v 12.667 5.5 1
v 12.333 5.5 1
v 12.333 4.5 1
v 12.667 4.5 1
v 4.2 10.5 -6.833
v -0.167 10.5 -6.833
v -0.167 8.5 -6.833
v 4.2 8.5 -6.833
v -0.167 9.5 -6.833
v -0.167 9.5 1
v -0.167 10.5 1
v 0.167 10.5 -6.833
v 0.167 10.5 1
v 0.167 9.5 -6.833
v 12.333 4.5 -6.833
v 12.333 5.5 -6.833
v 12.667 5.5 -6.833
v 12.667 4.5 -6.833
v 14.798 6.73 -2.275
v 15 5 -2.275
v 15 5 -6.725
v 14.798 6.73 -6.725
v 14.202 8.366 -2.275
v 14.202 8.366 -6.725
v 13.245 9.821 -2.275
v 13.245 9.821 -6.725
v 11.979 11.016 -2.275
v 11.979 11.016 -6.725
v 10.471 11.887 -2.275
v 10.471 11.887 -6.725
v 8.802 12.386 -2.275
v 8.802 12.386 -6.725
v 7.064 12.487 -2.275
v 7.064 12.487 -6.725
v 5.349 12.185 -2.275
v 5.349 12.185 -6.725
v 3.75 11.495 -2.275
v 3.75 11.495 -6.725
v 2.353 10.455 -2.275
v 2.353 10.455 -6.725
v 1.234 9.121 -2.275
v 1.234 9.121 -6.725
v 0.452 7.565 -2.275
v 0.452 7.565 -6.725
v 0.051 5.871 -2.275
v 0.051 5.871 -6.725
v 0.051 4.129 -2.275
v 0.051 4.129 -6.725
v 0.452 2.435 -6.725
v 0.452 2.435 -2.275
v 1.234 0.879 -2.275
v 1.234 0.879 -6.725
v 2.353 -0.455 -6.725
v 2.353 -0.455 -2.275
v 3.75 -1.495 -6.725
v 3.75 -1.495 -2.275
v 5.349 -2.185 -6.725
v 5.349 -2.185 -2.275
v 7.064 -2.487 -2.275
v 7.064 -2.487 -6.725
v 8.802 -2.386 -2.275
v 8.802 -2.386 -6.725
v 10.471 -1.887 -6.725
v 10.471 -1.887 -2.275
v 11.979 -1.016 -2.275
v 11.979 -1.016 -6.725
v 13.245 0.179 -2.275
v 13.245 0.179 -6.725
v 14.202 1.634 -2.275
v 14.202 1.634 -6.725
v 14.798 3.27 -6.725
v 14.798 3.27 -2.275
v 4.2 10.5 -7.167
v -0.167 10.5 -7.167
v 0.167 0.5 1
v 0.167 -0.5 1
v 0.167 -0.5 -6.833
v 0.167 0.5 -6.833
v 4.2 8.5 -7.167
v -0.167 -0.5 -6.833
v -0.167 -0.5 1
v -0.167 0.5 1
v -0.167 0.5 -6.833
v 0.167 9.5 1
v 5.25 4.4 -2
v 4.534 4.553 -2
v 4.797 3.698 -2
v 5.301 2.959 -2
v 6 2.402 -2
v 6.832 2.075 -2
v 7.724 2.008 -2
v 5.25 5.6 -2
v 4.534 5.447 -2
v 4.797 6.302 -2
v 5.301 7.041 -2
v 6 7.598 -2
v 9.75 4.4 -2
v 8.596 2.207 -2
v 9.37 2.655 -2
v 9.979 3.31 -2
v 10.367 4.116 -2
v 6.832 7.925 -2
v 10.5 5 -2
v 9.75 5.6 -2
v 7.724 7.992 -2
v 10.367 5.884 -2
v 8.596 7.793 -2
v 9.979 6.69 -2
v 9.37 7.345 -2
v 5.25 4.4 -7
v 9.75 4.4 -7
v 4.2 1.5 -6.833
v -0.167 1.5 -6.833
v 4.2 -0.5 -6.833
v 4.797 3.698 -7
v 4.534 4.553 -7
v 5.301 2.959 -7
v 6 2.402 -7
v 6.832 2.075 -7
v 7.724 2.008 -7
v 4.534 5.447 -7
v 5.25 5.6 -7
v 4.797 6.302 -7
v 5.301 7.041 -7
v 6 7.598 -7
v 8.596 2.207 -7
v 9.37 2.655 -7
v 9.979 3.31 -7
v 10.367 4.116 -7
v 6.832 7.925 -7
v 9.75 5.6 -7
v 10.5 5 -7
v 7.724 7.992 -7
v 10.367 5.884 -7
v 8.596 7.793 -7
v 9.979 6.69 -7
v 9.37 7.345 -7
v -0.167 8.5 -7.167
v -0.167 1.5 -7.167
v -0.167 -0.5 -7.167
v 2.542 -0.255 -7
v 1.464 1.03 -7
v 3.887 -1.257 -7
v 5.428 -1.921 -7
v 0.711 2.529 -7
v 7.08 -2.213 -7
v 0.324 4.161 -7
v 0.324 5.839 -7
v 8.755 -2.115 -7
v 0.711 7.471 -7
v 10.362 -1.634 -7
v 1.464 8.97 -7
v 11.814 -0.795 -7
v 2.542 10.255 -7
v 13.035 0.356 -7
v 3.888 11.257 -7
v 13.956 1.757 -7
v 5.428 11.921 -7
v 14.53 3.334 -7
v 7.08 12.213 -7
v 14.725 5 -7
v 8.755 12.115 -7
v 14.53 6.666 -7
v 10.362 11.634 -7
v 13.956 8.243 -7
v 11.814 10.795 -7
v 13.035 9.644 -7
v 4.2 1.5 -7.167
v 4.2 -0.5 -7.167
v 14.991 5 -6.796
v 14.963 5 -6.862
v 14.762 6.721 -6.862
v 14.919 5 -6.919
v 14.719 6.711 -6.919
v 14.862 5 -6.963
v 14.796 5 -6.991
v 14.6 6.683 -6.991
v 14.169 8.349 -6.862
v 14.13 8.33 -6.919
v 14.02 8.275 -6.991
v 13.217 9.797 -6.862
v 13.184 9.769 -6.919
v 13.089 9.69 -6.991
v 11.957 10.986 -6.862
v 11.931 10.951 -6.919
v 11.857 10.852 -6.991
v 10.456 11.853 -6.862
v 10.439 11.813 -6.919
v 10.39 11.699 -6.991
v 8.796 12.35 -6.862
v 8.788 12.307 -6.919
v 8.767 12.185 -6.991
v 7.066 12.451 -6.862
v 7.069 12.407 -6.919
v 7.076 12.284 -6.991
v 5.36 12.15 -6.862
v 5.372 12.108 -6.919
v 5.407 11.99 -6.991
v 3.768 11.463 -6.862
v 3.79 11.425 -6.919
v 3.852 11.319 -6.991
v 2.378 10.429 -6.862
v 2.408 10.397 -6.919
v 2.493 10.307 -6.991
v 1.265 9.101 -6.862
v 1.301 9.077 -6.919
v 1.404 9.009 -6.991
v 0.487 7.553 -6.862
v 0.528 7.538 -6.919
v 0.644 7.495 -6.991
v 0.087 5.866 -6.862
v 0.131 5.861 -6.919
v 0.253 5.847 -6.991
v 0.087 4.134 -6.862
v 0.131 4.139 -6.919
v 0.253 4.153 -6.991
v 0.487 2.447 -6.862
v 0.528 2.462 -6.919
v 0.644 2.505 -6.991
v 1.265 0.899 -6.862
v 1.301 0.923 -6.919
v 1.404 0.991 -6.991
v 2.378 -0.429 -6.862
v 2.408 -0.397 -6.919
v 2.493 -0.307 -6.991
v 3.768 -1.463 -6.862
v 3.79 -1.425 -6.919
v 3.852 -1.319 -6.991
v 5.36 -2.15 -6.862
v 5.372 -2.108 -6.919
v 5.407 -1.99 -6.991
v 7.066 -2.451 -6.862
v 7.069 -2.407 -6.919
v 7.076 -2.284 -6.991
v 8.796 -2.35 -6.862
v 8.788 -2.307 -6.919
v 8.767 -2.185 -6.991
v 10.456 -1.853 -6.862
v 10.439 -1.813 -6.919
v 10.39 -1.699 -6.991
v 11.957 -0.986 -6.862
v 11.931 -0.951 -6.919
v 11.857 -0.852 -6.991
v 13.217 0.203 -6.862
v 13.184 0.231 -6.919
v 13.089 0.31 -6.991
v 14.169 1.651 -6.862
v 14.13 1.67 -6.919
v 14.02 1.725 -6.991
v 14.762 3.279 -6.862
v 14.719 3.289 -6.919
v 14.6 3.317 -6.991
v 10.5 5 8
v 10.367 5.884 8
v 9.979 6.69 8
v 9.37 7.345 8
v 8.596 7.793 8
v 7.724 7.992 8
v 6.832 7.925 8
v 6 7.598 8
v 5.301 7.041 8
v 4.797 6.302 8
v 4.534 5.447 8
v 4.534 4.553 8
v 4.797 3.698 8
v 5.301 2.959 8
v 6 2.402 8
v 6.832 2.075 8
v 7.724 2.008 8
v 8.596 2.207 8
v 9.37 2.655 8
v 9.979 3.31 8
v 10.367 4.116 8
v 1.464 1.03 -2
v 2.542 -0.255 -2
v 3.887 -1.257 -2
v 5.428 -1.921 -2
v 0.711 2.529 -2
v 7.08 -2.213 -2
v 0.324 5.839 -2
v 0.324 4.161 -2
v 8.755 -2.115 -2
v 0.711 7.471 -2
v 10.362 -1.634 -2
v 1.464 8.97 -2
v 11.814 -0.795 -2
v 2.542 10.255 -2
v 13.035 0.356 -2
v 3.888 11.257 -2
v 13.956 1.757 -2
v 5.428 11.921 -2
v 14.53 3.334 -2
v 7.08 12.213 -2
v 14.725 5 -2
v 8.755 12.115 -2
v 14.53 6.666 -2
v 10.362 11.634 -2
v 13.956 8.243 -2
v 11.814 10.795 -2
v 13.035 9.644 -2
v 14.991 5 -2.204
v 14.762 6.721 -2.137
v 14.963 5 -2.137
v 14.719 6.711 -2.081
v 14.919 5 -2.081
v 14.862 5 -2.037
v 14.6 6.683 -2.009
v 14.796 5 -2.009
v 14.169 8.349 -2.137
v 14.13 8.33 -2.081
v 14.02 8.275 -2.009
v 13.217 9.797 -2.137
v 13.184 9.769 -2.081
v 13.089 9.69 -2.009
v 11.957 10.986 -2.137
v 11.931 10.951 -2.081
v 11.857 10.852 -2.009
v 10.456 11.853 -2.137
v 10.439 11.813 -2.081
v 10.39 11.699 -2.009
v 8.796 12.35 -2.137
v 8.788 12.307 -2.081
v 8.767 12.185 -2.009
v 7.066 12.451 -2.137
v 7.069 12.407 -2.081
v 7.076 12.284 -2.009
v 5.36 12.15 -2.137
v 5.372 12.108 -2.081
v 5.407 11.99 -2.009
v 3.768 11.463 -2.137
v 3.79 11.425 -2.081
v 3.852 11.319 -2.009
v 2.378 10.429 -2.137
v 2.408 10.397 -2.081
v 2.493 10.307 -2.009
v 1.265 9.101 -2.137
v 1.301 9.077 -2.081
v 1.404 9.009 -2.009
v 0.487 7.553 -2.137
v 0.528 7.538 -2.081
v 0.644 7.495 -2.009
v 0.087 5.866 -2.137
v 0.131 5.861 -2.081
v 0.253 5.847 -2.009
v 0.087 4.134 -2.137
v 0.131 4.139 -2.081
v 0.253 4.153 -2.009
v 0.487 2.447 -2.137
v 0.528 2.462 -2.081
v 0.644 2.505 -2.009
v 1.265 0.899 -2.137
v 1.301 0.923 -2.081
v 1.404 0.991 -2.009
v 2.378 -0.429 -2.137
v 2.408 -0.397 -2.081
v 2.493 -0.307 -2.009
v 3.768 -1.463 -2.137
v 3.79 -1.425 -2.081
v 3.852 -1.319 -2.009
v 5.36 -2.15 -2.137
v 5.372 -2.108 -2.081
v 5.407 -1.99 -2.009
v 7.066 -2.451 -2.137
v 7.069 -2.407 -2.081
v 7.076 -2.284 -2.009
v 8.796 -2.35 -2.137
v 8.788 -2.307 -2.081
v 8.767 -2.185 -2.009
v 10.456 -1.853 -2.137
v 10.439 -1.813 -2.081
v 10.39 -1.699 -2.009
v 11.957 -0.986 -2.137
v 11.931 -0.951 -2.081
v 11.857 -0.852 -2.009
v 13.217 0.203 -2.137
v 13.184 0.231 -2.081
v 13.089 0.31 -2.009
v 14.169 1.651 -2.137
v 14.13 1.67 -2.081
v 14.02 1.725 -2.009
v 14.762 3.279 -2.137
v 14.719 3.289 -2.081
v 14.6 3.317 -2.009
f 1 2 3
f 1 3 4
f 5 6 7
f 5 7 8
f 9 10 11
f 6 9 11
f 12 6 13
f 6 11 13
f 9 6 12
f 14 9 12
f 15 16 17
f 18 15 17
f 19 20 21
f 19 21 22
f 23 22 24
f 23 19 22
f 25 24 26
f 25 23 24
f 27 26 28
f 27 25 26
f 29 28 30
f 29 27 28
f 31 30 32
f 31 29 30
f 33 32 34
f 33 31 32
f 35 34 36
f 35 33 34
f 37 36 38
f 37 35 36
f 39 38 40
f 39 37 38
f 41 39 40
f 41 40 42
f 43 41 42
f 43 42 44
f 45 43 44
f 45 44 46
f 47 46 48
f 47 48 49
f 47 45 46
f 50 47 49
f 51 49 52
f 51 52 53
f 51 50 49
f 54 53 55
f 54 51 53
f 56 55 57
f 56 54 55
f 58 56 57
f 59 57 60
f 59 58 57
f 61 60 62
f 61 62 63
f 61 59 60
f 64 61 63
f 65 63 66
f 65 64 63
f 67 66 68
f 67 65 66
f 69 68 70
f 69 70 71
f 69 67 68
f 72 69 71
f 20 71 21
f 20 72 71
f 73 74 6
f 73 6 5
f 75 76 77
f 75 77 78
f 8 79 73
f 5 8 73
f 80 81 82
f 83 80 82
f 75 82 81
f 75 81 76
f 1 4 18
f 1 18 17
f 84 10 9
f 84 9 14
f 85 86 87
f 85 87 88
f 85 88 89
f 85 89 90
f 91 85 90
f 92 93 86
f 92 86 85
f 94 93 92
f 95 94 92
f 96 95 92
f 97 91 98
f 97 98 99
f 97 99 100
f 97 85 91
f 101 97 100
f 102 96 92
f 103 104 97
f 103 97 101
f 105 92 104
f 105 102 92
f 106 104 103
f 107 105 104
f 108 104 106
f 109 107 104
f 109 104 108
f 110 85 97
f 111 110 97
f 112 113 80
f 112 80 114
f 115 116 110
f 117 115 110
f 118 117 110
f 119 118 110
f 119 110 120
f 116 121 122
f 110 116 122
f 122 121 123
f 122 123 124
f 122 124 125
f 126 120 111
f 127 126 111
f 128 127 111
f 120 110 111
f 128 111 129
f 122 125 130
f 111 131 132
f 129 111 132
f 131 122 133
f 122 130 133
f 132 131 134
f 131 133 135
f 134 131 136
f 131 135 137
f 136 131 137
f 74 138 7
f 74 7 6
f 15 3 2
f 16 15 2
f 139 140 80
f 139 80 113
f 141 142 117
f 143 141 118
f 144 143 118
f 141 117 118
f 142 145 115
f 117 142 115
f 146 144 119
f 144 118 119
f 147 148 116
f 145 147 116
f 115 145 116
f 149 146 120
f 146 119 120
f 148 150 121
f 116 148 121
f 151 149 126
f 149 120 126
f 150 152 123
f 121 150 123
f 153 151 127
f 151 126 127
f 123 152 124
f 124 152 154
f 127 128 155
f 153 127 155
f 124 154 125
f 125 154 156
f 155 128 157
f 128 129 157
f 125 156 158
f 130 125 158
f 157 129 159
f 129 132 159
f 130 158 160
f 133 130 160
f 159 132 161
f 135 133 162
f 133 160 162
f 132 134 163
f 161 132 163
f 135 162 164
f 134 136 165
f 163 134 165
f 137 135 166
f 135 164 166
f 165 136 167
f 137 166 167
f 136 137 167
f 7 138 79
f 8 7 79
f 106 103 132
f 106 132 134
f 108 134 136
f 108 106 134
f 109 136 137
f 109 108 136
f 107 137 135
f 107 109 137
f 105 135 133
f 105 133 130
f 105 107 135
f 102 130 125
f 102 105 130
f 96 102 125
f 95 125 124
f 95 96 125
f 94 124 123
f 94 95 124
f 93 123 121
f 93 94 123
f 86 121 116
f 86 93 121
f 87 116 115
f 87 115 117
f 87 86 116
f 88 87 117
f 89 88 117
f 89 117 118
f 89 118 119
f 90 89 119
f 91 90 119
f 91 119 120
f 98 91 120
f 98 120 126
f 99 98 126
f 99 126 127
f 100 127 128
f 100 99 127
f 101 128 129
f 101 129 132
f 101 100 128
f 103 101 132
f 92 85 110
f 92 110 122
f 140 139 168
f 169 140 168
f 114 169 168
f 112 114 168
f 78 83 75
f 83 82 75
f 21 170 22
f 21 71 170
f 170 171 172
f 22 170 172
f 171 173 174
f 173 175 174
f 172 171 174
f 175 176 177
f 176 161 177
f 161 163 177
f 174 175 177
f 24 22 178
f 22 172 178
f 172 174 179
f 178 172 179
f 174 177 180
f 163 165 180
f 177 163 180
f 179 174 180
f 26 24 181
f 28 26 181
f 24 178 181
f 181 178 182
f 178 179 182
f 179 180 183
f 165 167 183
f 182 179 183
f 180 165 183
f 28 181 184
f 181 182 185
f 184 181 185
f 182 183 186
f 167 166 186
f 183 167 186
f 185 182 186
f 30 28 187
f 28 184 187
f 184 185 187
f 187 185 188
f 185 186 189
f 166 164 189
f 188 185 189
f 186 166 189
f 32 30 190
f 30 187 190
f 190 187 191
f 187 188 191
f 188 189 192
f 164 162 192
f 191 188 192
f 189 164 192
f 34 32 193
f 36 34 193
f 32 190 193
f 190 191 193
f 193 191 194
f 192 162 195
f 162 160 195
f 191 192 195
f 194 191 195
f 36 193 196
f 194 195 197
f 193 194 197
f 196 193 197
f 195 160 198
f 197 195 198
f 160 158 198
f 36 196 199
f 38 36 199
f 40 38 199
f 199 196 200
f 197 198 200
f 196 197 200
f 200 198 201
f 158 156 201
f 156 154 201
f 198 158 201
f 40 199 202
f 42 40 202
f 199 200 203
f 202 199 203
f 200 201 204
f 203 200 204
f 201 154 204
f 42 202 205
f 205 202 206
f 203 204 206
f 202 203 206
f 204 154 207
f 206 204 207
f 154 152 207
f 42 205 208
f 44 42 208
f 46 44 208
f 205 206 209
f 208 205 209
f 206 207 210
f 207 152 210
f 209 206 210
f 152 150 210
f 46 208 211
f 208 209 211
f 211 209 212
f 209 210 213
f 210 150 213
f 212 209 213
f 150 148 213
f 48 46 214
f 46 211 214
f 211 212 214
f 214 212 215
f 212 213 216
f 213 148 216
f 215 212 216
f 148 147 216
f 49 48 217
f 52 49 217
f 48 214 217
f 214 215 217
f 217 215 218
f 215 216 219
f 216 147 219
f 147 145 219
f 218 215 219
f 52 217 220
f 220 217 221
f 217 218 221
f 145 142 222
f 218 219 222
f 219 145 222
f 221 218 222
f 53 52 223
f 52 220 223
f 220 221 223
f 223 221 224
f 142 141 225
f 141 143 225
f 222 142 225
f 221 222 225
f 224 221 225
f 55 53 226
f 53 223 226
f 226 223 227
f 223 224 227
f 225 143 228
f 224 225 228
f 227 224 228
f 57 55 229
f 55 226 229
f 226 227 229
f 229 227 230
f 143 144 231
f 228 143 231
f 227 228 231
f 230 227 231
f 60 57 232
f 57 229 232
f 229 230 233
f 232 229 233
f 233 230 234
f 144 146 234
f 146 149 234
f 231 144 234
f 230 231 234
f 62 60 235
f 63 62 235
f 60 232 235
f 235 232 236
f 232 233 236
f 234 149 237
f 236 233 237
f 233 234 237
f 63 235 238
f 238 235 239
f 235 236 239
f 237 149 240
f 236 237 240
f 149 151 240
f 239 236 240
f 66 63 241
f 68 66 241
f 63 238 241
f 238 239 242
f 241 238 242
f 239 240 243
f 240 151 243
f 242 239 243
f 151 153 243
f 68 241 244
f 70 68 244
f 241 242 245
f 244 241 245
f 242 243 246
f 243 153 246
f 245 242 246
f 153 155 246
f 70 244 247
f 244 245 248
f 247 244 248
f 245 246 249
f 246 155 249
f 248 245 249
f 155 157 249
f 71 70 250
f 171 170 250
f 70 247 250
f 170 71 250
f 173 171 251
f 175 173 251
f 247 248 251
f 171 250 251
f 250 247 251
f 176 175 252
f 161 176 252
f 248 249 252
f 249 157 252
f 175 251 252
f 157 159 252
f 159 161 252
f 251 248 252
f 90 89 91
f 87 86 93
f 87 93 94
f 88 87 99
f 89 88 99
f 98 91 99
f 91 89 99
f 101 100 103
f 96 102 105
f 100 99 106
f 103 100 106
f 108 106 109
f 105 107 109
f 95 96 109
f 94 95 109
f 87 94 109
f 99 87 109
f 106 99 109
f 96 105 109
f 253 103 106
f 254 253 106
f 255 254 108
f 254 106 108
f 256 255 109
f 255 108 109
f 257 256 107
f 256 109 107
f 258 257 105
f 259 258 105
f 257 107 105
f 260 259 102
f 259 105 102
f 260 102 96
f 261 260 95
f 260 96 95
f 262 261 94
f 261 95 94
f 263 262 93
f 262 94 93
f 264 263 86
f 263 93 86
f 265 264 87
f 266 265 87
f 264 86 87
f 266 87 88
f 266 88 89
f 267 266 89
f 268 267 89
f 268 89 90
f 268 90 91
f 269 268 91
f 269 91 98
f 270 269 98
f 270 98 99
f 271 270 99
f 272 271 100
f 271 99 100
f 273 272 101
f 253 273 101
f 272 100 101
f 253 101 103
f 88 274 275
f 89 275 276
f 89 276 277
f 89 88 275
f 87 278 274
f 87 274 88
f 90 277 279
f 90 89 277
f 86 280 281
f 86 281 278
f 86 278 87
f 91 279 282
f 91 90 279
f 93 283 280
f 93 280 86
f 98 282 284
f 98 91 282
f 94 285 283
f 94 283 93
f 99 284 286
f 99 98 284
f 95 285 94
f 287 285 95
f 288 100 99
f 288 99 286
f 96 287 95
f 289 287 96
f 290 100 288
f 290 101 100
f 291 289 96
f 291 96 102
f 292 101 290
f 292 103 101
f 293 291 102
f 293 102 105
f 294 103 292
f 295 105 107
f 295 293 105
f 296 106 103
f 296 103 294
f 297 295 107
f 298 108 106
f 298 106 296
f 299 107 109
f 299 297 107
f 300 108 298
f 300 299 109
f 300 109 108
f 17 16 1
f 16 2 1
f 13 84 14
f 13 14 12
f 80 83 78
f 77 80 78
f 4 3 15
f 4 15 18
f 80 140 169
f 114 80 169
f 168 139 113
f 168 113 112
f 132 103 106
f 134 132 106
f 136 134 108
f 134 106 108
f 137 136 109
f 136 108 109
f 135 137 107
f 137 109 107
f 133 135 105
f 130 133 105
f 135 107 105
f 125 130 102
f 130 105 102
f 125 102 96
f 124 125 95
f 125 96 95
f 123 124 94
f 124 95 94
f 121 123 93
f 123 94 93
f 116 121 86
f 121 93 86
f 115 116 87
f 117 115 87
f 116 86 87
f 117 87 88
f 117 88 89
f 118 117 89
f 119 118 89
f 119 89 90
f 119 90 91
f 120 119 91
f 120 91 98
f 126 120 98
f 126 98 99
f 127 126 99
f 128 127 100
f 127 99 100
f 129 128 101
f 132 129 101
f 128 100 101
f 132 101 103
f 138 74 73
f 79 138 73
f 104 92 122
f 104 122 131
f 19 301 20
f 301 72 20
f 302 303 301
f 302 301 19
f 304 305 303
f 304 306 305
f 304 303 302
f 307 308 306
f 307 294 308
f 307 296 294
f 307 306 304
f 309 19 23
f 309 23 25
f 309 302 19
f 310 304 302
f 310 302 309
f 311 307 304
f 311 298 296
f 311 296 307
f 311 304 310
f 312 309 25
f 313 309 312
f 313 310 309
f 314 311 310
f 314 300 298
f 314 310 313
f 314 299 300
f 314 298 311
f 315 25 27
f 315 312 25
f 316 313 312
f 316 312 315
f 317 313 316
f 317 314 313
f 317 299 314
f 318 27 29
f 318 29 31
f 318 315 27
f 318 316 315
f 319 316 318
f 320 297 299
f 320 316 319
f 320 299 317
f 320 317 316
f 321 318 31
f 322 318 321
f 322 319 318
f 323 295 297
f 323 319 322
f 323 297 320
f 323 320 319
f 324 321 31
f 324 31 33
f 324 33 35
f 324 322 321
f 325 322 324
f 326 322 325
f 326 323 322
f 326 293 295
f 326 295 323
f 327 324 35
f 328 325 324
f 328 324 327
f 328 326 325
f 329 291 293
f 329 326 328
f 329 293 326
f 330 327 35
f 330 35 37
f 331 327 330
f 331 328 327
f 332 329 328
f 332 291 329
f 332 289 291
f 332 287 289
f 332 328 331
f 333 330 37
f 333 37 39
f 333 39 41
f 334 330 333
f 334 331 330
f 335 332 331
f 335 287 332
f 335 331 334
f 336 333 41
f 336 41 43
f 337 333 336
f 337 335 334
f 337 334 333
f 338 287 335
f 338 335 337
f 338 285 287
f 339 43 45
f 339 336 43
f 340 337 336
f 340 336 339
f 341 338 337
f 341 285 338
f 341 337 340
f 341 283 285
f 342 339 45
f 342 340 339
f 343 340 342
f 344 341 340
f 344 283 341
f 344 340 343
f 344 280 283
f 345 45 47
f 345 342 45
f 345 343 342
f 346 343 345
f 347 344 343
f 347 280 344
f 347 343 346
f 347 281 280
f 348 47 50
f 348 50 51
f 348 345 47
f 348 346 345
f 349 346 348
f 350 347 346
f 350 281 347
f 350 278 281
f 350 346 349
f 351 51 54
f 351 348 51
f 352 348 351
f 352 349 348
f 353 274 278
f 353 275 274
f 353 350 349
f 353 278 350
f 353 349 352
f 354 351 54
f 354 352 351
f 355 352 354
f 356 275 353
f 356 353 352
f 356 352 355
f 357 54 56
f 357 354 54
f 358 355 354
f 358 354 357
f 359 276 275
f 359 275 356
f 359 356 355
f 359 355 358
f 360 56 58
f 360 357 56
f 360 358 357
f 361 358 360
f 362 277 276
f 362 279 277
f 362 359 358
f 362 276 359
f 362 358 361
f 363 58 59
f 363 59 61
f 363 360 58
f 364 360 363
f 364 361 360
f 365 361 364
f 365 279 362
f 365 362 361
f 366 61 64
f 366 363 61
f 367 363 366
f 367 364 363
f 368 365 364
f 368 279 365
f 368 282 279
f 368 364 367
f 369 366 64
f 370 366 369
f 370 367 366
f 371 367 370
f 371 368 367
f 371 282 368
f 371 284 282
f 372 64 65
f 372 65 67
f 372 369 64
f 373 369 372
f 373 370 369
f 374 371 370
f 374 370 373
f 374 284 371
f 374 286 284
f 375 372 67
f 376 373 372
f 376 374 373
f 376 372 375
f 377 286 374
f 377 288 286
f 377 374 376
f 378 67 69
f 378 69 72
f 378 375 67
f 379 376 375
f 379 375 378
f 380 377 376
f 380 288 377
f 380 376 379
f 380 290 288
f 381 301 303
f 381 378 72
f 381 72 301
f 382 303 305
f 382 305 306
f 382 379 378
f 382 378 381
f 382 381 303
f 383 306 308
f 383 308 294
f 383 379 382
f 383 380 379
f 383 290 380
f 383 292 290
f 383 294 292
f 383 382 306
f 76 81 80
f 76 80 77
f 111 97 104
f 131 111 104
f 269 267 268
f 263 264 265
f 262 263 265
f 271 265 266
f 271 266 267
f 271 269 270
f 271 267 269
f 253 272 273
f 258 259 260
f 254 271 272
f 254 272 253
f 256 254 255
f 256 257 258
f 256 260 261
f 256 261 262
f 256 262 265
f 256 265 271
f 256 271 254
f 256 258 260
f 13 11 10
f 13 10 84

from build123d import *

# Parameters (mm, degrees)
SKETCH003_W       = 0.333334
SKETCH003_H       = 1
PAD002_DEPTH      = 1
PAD002_DEPTH_BACK = 6.833333
SKETCH004_R       = 3
SKETCH004_W       = 4.5
SKETCH004_H       = 1.2
PAD003_DEPTH      = 5
SKETCH_R          = 7.5
SKETCH_R_2        = 3
PAD_DEPTH         = 5
FILLET_R          = 0.275
SKETCH005_W       = 4.366667
SKETCH005_H       = 2
PAD004_DEPTH      = 0.333333
SKETCH006_R       = 3
PAD005_DEPTH      = 10


with BuildPart() as pad002:
    # Sketch003 → Pad002 (new body, two sides)
    with BuildSketch(Plane(origin=(0, 10, 0), x_dir=(1, 0, 0), z_dir=(0, 0, 1))) as pad002_sk:
        Rectangle(SKETCH003_W, SKETCH003_H)
        with Locations((12.5, -5)):
            Rectangle(SKETCH003_W, SKETCH003_H)
        with Locations((0, -10)):
            Rectangle(SKETCH003_W, SKETCH003_H)
    extrude(amount=PAD002_DEPTH)
    extrude(pad002_sk.sketch, amount=-PAD002_DEPTH_BACK)


with BuildPart() as pad003:
    # Sketch004 → Pad003 (new body)
    with BuildSketch(Plane(origin=(0, 10, -2), x_dir=(1, 0, 0), z_dir=(0, 0, 1))):
        with Locations((7.5, -5)):
            Circle(SKETCH004_R)
        with Locations((7.5, -5)):
            Rectangle(SKETCH004_W, SKETCH004_H, mode=Mode.SUBTRACT)
    extrude(amount=-PAD003_DEPTH)


with BuildPart() as fillet_body:
    # Sketch → Pad (new body)
    with BuildSketch(Plane(origin=(0, 10, -2), x_dir=(1, 0, 0), z_dir=(0, 0, 1))):
        with Locations((7.5, -5)):
            Circle(SKETCH_R)
        with Locations((7.5, -5)):
            Circle(SKETCH_R_2, mode=Mode.SUBTRACT)
    extrude(amount=-PAD_DEPTH)

    # Fillet
    fillet_edges = [fillet_body.edges().sort_by_distance(p)[0] for p in [
        (0, 5, -2),
        (0, 5, -7),
    ]]
    fillet(fillet_edges, radius=FILLET_R)


with BuildPart() as pad004:
    # Sketch005 → Pad004 (new body)
    with BuildSketch(Plane(origin=(0, 10, -7.166667), x_dir=(1, 0, 0), z_dir=(0, 0, 1))):
        with Locations((2.016666, -0.5)):
            Rectangle(SKETCH005_W, SKETCH005_H)
        with Locations((2.016666, -9.5)):
            Rectangle(SKETCH005_W, SKETCH005_H)
    extrude(amount=PAD004_DEPTH)


with BuildPart() as pad005:
    # Sketch006 → Pad005 (new body)
    with BuildSketch(Plane(origin=(0, 10, -2), x_dir=(1, 0, 0), z_dir=(0, 0, 1))):
        with Locations((7.5, -5)):
            Circle(SKETCH006_R)
    extrude(amount=PAD005_DEPTH)


solid = Compound([pad002.part, pad003.part, fillet_body.part, pad004.part, pad005.part])
